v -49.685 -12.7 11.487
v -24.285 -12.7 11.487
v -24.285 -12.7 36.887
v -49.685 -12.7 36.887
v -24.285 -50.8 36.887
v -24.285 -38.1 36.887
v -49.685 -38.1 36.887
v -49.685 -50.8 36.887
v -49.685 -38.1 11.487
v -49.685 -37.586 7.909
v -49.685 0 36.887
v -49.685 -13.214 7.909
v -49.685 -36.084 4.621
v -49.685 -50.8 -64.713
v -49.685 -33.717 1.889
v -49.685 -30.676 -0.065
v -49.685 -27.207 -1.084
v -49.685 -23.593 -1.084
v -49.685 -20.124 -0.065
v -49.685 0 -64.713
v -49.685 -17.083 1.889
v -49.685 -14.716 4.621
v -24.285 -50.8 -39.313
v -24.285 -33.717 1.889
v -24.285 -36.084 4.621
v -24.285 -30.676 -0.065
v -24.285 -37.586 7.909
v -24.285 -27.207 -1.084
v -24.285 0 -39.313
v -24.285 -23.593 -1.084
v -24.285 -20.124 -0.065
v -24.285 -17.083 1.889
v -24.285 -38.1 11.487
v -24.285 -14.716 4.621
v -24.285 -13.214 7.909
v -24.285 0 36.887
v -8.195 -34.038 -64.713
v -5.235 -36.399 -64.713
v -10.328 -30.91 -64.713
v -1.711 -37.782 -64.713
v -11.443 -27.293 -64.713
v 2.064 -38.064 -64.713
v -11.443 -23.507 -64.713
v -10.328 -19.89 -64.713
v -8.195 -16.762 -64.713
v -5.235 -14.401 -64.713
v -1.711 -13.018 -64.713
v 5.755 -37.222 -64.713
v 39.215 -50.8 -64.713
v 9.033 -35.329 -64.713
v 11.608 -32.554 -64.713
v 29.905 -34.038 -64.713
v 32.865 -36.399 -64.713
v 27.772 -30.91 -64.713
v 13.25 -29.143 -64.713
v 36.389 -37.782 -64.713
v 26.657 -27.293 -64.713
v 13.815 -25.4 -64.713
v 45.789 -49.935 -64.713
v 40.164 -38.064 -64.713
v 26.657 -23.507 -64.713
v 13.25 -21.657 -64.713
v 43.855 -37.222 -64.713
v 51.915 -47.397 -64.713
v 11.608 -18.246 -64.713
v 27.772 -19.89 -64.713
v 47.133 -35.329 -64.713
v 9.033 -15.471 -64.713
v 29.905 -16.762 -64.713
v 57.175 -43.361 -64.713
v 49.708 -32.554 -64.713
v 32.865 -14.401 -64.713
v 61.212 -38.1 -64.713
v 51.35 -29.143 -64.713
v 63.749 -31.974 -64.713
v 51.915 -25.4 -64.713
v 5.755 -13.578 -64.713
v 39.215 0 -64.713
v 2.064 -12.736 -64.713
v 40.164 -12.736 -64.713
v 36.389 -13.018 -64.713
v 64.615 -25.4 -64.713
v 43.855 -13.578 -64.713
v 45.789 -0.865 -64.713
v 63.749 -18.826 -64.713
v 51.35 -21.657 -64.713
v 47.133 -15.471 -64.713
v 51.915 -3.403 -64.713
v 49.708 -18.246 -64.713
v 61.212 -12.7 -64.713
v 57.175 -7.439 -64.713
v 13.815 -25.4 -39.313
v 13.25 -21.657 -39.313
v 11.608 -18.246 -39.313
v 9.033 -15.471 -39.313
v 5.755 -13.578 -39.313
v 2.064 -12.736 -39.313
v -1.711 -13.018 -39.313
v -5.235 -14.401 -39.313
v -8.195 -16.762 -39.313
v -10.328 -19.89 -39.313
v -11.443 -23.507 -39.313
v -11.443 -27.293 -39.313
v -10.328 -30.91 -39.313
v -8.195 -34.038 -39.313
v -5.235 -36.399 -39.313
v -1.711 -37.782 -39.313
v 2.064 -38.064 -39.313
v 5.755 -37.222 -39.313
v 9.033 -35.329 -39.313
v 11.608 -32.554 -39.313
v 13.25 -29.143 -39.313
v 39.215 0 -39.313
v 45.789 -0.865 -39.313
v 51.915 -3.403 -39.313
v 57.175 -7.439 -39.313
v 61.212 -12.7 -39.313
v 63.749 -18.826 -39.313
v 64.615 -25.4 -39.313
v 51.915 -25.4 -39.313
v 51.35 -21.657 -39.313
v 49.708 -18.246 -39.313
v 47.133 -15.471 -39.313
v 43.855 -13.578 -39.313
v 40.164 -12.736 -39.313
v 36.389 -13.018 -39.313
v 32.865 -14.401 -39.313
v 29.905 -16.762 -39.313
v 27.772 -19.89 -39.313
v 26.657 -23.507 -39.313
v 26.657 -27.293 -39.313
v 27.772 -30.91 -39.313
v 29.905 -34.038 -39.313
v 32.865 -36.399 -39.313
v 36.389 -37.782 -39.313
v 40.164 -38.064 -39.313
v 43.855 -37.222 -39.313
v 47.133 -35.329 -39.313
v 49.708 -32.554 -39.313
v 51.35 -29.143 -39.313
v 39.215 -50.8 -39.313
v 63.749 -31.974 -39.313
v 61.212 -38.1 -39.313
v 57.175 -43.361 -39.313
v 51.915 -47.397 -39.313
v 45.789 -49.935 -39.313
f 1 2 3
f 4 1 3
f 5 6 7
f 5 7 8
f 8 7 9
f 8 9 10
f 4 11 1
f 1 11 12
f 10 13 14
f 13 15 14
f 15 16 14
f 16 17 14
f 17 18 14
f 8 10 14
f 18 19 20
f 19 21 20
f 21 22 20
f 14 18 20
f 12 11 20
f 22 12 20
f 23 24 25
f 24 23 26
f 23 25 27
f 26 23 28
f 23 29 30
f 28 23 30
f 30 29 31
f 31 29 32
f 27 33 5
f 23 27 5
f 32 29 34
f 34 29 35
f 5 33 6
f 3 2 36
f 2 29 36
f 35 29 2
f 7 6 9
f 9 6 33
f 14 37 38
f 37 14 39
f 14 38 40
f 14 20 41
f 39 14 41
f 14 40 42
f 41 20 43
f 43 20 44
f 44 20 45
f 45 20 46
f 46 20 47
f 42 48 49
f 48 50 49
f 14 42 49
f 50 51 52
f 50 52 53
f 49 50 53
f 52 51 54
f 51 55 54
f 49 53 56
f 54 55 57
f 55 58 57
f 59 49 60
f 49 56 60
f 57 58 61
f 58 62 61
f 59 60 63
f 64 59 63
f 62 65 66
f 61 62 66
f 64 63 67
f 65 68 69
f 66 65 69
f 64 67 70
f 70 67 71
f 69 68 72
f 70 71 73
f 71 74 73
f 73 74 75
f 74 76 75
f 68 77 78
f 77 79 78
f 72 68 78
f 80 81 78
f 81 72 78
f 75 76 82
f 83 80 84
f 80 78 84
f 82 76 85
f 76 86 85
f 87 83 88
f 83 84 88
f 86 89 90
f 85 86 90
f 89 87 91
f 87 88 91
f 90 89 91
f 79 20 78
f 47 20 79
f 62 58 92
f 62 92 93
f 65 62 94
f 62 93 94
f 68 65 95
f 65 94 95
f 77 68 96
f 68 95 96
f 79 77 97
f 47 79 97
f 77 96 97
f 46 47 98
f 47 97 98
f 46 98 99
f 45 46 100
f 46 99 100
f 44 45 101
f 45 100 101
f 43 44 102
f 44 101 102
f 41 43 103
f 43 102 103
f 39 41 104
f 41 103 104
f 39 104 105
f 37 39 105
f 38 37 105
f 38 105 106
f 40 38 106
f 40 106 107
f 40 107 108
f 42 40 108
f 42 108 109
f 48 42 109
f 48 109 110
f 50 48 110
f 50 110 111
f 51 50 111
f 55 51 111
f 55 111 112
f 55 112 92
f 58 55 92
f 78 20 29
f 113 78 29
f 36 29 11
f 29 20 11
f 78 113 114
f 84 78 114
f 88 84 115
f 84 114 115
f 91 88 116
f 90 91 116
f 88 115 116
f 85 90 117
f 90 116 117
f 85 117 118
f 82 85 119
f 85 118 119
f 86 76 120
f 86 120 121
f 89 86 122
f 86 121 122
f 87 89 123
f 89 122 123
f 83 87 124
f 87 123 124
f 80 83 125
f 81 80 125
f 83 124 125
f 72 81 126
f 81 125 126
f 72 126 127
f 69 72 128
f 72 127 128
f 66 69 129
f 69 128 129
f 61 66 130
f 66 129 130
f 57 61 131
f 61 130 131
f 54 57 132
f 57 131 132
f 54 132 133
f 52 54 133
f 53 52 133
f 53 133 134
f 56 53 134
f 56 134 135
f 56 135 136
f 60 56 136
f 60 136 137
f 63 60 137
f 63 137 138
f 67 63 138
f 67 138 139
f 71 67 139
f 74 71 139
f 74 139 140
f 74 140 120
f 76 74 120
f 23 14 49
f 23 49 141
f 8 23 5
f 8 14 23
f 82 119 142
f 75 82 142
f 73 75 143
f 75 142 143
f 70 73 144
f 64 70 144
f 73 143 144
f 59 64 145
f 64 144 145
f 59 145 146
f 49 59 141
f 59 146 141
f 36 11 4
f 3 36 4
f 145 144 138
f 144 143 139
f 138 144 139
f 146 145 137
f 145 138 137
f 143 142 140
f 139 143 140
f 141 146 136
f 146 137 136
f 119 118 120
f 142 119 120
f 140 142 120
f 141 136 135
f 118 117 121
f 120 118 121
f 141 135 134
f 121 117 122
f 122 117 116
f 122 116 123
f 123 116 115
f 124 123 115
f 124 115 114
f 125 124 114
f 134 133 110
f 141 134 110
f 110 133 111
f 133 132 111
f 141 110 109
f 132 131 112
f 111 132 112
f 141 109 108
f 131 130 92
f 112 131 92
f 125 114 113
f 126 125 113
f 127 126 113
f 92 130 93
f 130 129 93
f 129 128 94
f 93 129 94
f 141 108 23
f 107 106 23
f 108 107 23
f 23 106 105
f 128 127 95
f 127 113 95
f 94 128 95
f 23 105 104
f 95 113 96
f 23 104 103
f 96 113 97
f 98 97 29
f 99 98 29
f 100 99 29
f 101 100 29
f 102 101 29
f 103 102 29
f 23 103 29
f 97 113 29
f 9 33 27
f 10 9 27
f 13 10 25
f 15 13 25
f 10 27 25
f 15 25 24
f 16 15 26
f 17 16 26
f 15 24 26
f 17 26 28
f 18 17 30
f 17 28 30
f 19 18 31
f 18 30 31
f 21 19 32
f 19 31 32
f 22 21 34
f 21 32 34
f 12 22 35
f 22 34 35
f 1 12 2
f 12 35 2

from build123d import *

# Parameters (mm, degrees)
F1_DEPTH = 50.8
F3_DEPTH = 25.4
F5_DEPTH = 12.7
F6_DEPTH = 12.7
F8_DEPTH = 25.401
F4_R     = 12.7
F9_DEPTH = 25.401


with BuildPart() as f1:
    # F0 (on Front) → F1 (new body)
    with BuildSketch(Plane.XZ):
        Polygon((-36.9852854972, 36.8870242119), (-62.3852854972, 36.8870242119), (-62.3852854972, -64.7129757881), (64.6147145028, -64.7129757881), (64.6147145028, -39.3129757881), (-36.9852854972, -39.3129757881), align=None)
    extrude(amount=F1_DEPTH)

    # F2 (on face) → F3 (cut)
    with BuildSketch(Plane.XY.offset(-39.3129757881)):
        with BuildLine():
            ThreePointArc((64.6147145028, -25.4), (57.1752267449, -43.3605122421), (39.2147145028, -50.8))
            Line((39.2147145028, -50.8), (64.6147145028, -50.8))
            Line((64.6147145028, -50.8), (64.6147145028, -25.4))
        make_face()
        with BuildLine():
            ThreePointArc((39.2147145028, 0), (57.1752267449, -7.4394877579), (64.6147145028, -25.4))
            Line((64.6147145028, -25.4), (64.6147145028, 0))
            Line((64.6147145028, 0), (39.2147145028, 0))
        make_face()
    extrude(amount=-F3_DEPTH, mode=Mode.SUBTRACT)

    # F5 (add): a face of the model
    f5_faces = [f1.faces().sort_by_distance(p)[0] for p in [
        (-36.9852854972, -25.4, -1.2129757881),
    ]]
    extrude(f5_faces, amount=F5_DEPTH)

    # F6 (cut): a face of the model
    f6_faces = [f1.faces().sort_by_distance(p)[0] for p in [
        (-62.3852854972, -25.4, -13.9129757881),
    ]]
    extrude(f6_faces, amount=-F6_DEPTH, mode=Mode.SUBTRACT)

    # F7 (on face) → F8 (cut, through all)
    with BuildSketch(Plane.YZ.offset(-24.2852854972)):
        with BuildLine():
            Line((-38.1, 36.8870242119), (-38.1, 11.4870242119))
            ThreePointArc((-38.1, 11.4870242119), (-25.4, -1.2129757881), (-12.7, 11.4870242119))
            Line((-12.7, 11.4870242119), (-12.7, 36.8870242119))
            Line((-12.7, 36.8870242119), (-38.1, 36.8870242119))
        make_face()
    extrude(amount=-F8_DEPTH, mode=Mode.SUBTRACT)

    # F4 (on face) → F9 (cut, through all)
    with BuildSketch(Plane.XY.offset(-39.3129757881)):
        with Locations((1.1147145028, -25.4)):
            Circle(F4_R)
        with Locations((39.2147145028, -25.4)):
            Circle(F4_R)
    extrude(amount=-F9_DEPTH, mode=Mode.SUBTRACT)


solid = f1.part
